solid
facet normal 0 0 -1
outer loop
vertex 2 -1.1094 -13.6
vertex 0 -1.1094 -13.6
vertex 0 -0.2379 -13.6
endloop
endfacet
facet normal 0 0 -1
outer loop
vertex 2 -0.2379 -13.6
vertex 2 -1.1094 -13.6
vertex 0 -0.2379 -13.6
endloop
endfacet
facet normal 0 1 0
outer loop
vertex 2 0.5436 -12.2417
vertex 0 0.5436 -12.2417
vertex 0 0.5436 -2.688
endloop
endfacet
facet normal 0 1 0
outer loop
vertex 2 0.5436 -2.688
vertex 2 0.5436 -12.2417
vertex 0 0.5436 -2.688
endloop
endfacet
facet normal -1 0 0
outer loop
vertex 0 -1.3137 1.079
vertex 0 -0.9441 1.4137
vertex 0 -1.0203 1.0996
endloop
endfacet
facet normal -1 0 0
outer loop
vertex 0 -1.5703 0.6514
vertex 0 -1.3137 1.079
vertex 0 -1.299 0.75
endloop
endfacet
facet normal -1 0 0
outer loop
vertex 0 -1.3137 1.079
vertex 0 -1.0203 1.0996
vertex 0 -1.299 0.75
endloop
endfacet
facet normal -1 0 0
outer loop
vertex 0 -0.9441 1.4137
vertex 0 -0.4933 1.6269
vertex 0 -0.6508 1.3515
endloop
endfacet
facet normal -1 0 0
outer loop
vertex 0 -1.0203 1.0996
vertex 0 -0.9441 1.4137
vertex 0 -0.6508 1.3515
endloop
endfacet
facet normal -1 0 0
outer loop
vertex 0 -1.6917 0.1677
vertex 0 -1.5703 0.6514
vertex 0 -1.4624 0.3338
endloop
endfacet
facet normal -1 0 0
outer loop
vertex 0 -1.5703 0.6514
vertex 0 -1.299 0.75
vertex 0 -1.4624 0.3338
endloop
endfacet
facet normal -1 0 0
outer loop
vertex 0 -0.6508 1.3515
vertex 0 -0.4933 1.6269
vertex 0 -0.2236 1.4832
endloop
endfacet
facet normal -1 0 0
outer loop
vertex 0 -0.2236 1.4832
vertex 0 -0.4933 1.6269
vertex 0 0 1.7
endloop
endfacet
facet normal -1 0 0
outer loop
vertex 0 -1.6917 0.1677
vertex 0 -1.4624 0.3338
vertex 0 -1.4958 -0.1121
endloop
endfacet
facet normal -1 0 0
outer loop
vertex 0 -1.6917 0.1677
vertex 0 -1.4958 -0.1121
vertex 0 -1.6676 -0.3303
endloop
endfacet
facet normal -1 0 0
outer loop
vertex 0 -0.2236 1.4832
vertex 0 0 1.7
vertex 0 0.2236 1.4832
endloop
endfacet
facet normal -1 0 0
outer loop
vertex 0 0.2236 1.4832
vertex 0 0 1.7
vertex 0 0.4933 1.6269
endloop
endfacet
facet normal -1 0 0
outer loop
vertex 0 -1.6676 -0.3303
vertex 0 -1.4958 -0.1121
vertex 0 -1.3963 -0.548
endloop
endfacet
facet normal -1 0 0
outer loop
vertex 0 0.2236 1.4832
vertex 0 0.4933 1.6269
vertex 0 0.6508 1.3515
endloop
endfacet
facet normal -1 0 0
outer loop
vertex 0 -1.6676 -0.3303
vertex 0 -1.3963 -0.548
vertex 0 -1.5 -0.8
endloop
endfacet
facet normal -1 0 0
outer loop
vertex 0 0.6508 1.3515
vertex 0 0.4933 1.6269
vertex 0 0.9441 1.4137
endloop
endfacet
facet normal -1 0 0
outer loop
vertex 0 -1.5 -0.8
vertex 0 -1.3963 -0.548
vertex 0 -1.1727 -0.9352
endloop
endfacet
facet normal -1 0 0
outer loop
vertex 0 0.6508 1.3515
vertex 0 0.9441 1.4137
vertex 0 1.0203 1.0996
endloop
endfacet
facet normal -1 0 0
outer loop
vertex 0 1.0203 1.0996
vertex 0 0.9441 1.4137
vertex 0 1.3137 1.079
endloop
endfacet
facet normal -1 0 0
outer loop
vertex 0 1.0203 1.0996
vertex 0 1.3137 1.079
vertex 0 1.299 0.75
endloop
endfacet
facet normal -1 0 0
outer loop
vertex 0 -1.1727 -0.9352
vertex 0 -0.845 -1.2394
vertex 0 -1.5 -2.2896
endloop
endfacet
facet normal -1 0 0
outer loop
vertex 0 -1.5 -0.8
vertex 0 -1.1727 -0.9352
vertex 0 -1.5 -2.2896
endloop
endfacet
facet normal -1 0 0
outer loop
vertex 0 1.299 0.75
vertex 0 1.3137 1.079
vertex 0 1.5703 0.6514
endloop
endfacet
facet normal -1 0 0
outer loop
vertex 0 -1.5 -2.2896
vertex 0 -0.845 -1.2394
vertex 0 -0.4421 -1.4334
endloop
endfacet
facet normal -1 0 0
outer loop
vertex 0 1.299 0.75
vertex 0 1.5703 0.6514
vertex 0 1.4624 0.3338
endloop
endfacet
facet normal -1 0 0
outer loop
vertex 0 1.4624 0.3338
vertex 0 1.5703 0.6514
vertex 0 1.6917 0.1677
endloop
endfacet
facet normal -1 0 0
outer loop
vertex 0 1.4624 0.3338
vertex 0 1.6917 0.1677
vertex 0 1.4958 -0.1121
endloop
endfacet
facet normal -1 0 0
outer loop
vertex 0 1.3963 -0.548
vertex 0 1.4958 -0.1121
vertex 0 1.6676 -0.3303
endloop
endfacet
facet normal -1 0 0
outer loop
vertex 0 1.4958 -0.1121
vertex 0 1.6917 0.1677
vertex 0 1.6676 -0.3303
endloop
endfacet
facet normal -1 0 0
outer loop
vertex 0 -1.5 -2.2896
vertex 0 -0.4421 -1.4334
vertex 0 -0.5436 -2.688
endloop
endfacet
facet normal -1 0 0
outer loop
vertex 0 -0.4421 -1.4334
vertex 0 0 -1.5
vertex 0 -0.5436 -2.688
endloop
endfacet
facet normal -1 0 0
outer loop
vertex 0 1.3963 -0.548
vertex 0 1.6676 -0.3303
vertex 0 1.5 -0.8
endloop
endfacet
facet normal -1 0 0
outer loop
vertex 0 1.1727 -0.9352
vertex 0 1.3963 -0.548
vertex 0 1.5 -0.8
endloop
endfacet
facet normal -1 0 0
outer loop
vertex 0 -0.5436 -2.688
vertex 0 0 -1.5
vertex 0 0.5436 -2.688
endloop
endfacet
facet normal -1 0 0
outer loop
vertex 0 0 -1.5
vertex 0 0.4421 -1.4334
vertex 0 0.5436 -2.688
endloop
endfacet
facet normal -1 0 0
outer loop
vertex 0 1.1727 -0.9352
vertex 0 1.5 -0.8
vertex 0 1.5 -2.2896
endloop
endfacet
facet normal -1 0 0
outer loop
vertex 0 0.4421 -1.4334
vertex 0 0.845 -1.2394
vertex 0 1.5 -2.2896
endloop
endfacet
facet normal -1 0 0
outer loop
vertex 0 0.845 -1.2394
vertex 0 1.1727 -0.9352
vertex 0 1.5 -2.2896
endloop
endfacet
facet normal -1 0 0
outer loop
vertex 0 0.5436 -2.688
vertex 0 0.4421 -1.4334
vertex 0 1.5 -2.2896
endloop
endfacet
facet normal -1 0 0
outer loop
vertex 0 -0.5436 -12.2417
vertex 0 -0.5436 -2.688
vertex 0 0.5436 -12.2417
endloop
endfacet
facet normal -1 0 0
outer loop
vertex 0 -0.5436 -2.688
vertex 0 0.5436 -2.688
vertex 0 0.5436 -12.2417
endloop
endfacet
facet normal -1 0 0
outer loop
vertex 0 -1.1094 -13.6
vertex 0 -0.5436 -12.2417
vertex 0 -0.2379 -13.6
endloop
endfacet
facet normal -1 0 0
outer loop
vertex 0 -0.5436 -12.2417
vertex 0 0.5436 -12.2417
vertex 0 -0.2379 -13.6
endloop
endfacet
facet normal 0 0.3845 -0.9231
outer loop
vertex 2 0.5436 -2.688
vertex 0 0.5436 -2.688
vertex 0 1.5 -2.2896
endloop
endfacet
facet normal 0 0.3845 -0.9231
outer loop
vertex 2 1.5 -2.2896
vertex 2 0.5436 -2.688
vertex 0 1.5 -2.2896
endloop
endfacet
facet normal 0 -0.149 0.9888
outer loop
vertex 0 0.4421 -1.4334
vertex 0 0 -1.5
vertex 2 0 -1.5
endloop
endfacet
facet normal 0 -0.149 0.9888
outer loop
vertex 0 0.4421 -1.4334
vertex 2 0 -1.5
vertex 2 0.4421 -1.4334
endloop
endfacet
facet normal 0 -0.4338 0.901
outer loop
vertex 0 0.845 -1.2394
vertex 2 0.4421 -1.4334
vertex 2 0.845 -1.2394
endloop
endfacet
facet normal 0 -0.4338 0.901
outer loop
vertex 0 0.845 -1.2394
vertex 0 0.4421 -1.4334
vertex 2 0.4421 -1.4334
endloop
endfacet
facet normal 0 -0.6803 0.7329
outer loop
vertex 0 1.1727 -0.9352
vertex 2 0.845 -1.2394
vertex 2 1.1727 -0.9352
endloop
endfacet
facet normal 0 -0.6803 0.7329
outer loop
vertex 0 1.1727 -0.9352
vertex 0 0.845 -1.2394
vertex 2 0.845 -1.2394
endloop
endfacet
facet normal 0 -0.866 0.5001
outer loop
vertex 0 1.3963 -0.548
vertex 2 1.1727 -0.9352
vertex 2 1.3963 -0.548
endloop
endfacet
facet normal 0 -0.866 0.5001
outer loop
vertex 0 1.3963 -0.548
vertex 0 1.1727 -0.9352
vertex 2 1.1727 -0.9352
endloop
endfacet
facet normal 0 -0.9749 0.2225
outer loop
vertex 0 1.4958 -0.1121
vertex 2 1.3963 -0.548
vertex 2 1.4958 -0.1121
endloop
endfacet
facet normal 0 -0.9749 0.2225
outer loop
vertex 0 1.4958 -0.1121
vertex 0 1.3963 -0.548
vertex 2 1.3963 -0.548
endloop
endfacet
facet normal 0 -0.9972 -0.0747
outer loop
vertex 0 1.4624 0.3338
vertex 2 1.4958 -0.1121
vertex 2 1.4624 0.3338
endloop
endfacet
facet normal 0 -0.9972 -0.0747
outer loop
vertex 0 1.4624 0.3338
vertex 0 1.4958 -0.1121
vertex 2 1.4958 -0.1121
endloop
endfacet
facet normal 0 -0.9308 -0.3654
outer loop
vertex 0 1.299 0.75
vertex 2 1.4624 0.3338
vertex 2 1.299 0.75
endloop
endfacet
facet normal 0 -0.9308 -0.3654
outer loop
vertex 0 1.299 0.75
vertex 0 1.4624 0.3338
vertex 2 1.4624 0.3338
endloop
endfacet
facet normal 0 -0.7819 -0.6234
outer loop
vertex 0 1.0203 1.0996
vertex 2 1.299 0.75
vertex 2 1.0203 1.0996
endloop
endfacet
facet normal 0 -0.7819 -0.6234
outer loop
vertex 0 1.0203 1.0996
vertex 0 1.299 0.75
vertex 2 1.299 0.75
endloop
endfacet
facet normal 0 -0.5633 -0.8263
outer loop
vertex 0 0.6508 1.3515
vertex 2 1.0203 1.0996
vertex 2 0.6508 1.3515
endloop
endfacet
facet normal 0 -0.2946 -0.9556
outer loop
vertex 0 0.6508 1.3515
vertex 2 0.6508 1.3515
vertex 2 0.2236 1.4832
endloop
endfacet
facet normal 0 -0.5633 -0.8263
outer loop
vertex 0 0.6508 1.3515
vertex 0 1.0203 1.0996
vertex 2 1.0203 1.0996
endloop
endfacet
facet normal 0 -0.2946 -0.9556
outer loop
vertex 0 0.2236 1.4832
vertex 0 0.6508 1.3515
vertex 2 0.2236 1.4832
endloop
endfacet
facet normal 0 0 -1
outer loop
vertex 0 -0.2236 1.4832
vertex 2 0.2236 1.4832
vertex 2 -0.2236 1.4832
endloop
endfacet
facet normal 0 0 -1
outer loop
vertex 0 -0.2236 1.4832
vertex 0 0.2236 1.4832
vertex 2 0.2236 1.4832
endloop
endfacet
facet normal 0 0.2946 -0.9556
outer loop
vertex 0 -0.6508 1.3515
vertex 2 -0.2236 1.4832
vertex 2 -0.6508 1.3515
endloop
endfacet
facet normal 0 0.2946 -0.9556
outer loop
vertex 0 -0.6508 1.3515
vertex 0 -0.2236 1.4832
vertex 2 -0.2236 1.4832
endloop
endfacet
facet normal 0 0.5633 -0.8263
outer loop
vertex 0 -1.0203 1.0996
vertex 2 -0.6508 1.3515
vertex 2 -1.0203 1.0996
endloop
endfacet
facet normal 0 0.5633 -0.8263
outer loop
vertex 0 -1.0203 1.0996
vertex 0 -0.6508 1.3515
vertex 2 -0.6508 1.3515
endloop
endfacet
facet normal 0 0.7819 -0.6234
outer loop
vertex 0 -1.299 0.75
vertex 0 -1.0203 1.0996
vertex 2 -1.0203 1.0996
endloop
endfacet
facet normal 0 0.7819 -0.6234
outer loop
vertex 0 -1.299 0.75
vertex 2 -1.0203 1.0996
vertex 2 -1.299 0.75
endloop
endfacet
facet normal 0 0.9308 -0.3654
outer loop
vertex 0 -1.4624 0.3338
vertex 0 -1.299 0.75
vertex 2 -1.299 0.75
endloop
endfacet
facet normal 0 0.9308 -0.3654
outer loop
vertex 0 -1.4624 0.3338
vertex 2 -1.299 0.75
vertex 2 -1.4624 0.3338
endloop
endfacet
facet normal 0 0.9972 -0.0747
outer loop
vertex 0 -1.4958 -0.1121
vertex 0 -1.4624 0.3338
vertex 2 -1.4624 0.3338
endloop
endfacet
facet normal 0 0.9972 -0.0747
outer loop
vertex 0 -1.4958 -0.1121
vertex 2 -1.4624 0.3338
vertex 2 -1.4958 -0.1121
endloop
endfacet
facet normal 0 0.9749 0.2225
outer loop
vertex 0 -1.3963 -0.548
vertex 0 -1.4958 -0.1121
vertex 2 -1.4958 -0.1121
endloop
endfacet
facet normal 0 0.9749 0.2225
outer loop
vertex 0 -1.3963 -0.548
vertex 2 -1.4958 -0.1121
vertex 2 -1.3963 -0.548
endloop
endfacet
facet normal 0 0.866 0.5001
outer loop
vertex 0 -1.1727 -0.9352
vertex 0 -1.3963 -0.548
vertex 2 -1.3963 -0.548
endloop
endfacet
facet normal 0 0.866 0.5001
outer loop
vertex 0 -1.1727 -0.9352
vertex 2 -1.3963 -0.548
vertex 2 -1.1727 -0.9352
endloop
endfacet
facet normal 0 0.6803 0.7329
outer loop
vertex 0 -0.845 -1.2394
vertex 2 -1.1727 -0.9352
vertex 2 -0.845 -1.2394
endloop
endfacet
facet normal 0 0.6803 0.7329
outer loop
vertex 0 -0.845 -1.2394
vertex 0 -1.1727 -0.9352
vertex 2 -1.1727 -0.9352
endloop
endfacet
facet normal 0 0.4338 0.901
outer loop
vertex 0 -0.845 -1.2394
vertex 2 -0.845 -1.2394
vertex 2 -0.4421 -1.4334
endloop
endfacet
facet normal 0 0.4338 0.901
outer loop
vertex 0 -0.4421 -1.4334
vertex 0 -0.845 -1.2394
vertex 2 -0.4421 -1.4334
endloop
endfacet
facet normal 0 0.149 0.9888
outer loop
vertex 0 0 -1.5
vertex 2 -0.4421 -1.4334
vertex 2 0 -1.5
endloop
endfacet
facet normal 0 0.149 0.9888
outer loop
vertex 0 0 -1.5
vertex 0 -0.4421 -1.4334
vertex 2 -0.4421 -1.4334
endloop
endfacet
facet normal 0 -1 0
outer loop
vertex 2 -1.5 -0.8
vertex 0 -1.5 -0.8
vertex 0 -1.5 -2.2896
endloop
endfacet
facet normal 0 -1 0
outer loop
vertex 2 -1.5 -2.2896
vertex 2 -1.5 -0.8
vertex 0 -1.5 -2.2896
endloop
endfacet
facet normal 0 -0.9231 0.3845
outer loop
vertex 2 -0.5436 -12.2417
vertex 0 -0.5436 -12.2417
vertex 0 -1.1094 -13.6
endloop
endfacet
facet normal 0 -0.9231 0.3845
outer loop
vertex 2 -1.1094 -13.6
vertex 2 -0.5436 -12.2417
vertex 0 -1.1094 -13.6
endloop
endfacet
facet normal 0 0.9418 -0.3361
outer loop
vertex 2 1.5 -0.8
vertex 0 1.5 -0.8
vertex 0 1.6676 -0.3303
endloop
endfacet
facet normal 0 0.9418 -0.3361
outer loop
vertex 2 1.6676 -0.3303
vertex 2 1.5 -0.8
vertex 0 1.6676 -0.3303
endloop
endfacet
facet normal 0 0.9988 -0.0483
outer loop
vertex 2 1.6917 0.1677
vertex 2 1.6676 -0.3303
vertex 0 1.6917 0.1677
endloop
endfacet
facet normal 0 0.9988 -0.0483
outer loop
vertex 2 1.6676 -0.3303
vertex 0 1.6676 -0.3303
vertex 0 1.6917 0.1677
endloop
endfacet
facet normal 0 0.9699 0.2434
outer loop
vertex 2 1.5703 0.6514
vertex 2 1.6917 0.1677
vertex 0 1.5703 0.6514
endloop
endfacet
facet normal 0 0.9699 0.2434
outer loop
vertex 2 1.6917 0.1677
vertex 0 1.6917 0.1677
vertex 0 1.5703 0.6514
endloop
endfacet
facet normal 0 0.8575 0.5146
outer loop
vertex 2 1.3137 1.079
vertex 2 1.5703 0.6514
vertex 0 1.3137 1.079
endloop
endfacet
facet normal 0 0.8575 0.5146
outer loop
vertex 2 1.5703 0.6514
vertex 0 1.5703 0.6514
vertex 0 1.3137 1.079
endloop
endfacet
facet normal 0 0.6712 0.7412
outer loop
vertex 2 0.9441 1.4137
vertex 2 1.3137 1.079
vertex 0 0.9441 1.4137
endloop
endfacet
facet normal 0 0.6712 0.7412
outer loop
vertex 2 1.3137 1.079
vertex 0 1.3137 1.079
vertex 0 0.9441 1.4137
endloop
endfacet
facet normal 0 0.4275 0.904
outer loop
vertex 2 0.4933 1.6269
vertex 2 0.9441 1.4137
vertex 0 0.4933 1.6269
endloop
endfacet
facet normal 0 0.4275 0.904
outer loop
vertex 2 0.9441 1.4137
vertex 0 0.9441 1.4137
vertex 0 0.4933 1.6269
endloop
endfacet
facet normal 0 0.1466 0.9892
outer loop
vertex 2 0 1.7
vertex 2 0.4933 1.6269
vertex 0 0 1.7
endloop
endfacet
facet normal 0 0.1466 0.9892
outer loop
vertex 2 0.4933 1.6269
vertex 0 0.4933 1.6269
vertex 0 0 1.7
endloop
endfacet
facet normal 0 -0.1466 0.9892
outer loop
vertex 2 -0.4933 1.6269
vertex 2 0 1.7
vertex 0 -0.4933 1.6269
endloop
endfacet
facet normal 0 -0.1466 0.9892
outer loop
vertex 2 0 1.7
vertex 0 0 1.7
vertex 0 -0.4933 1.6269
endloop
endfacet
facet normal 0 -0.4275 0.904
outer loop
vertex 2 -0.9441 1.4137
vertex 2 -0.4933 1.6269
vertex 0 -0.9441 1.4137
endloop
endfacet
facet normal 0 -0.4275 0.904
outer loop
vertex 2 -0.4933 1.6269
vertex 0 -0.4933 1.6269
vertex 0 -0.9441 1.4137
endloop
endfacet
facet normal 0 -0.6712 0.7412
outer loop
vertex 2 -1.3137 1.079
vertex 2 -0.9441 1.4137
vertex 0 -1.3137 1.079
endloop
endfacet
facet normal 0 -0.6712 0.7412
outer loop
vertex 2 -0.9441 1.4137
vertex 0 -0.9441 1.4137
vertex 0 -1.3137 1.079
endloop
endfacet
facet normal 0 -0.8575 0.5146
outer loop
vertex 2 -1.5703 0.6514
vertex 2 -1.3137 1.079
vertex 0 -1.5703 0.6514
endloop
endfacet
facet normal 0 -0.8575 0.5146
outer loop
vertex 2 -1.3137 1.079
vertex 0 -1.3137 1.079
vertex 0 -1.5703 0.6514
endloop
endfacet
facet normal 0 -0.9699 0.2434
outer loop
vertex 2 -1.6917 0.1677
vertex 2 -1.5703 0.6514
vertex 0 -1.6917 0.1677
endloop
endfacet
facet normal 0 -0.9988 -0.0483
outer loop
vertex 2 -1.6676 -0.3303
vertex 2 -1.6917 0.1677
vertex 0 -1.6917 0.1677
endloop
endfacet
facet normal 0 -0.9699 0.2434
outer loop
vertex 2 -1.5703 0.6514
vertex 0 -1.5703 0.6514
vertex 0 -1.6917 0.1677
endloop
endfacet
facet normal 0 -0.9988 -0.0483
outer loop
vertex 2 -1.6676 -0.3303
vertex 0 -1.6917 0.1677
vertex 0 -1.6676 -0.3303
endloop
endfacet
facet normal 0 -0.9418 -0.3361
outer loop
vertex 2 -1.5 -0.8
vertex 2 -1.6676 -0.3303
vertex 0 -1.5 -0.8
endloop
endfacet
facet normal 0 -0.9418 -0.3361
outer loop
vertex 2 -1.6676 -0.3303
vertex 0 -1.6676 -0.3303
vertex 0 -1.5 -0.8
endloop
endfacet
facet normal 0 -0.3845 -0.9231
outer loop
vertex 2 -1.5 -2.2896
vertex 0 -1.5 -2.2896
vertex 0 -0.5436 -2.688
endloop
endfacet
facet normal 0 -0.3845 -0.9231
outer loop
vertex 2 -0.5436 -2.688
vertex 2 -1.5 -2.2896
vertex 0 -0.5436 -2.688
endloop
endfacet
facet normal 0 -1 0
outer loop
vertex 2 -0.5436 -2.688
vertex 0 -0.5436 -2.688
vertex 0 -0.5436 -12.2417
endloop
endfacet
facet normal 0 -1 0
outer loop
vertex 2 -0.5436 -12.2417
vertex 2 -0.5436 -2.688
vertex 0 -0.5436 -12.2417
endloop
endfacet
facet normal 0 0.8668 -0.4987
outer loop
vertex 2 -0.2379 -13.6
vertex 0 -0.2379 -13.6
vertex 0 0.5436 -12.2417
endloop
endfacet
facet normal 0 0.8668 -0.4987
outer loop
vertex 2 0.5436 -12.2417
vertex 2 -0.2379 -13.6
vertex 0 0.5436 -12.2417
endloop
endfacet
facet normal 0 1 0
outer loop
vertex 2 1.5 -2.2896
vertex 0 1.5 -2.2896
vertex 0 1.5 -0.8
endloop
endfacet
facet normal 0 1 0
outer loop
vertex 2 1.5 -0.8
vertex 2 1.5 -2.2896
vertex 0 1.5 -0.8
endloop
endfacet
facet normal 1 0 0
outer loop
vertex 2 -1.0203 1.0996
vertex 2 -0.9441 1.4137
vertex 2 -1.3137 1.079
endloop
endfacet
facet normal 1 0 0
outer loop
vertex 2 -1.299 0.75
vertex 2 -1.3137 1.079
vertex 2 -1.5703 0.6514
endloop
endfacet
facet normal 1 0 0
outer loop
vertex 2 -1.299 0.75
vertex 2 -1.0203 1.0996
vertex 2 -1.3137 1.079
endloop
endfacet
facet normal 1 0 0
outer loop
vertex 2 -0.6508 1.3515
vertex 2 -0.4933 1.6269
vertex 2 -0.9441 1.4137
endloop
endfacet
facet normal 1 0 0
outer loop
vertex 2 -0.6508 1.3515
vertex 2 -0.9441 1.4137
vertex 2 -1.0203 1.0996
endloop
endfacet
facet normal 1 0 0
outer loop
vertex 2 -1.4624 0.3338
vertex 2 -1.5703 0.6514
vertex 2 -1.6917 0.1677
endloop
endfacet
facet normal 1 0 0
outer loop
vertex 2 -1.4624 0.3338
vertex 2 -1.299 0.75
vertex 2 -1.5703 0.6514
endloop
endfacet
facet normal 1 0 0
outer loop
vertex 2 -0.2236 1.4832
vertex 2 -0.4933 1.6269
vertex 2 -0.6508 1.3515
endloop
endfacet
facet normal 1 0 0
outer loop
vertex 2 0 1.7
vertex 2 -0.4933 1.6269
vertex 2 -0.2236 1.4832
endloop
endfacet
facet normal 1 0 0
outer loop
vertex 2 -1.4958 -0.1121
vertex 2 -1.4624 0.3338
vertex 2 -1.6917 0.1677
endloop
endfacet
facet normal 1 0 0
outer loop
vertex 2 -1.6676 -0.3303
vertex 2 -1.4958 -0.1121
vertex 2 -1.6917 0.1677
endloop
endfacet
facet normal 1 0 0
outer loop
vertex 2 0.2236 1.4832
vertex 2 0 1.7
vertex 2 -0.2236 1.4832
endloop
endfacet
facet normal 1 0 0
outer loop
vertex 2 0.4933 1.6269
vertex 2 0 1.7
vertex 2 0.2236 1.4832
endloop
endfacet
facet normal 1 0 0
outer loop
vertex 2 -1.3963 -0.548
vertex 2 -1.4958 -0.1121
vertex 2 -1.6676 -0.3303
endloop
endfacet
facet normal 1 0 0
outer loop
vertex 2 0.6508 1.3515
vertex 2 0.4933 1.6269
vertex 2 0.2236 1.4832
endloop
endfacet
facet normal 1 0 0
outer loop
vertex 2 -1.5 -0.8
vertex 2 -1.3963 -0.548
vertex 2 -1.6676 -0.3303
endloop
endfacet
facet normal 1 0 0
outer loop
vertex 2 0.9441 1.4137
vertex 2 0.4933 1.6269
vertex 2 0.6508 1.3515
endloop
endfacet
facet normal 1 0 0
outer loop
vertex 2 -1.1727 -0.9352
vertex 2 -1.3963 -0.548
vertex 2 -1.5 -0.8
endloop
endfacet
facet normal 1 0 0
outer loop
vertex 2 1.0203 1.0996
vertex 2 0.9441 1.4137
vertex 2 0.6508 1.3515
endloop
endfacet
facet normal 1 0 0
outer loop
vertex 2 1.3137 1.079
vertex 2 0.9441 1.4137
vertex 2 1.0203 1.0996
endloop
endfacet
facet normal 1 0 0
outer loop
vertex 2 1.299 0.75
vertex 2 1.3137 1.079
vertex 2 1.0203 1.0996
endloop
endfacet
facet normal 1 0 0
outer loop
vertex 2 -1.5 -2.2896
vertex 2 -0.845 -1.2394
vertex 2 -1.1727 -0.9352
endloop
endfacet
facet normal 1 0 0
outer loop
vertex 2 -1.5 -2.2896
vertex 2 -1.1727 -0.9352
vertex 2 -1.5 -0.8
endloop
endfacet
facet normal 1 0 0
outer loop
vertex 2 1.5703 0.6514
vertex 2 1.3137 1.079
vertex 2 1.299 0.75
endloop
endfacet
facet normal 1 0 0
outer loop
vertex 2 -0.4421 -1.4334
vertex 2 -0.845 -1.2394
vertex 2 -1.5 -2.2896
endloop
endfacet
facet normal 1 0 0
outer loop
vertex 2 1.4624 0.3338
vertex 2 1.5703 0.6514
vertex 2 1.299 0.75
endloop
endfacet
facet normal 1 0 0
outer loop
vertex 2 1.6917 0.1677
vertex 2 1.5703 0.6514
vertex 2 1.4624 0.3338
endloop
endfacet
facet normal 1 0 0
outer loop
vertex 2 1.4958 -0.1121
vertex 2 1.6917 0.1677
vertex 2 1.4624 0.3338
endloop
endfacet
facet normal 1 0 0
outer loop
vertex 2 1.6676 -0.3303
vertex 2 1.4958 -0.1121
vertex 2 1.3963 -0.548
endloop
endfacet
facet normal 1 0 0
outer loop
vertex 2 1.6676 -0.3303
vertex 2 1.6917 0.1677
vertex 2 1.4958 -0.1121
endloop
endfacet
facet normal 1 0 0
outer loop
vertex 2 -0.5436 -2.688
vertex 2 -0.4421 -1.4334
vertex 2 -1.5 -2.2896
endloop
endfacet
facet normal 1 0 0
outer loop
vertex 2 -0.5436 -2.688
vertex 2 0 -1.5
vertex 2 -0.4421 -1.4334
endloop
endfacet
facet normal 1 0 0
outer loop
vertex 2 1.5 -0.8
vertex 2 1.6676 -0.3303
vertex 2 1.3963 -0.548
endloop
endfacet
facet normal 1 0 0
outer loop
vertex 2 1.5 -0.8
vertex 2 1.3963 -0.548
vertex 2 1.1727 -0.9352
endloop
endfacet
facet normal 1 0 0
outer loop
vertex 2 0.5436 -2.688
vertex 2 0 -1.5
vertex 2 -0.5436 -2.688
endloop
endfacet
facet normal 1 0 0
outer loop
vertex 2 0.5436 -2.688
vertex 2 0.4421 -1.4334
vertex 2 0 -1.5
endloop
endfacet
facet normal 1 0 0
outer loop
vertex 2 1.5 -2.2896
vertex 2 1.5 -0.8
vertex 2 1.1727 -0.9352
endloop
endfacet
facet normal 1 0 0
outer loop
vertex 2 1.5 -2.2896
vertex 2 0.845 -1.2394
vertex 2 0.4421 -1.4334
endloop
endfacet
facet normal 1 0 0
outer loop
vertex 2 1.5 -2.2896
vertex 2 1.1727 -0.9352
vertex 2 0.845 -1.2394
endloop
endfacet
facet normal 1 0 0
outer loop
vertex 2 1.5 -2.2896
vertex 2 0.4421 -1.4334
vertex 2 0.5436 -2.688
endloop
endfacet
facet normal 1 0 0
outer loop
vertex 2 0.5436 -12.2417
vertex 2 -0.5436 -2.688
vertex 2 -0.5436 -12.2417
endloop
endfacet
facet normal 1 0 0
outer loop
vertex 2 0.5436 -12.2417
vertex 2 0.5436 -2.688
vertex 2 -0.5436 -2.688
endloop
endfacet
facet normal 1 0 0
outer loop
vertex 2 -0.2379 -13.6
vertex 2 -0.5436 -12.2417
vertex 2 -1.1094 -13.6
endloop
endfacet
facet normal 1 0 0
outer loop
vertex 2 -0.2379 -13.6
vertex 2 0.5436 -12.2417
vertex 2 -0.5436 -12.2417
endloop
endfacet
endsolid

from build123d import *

# Parameters (mm, degrees)
CROQUIS2_R              = 1.5
SALIENTE_EXTRUIR1_DEPTH = 2


with BuildPart() as part:
    # Croquis2 → Saliente-Extruir1 (new body)
    with BuildSketch(Plane(origin=(0, 0, 0), x_dir=(0, 0, -1), z_dir=(1, 0, 0))):
        with BuildLine():
            Line((2.289585189, 1.5), (0.8, 1.5))
            ThreePointArc((0.8, 1.5), (-1.7, 0), (0.8, -1.5))
            Line((0.8, -1.5), (2.289585189, -1.5))
            Line((2.289585189, -1.5), (2.688008385, -0.543556392))
            Line((2.688008385, -0.543556392), (12.241709619, -0.543556392))
            Line((12.241709619, -0.543556392), (13.6, -1.109375841))
            Line((13.6, -1.109375841), (13.6, -0.237921662))
            Line((13.6, -0.237921662), (12.241709619, 0.543556392))
            Line((12.241709619, 0.543556392), (2.688008385, 0.543556392))
            Line((2.688008385, 0.543556392), (2.289585189, 1.5))
        make_face()
        Circle(CROQUIS2_R, mode=Mode.SUBTRACT)
    extrude(amount=SALIENTE_EXTRUIR1_DEPTH)


solid = part.part
